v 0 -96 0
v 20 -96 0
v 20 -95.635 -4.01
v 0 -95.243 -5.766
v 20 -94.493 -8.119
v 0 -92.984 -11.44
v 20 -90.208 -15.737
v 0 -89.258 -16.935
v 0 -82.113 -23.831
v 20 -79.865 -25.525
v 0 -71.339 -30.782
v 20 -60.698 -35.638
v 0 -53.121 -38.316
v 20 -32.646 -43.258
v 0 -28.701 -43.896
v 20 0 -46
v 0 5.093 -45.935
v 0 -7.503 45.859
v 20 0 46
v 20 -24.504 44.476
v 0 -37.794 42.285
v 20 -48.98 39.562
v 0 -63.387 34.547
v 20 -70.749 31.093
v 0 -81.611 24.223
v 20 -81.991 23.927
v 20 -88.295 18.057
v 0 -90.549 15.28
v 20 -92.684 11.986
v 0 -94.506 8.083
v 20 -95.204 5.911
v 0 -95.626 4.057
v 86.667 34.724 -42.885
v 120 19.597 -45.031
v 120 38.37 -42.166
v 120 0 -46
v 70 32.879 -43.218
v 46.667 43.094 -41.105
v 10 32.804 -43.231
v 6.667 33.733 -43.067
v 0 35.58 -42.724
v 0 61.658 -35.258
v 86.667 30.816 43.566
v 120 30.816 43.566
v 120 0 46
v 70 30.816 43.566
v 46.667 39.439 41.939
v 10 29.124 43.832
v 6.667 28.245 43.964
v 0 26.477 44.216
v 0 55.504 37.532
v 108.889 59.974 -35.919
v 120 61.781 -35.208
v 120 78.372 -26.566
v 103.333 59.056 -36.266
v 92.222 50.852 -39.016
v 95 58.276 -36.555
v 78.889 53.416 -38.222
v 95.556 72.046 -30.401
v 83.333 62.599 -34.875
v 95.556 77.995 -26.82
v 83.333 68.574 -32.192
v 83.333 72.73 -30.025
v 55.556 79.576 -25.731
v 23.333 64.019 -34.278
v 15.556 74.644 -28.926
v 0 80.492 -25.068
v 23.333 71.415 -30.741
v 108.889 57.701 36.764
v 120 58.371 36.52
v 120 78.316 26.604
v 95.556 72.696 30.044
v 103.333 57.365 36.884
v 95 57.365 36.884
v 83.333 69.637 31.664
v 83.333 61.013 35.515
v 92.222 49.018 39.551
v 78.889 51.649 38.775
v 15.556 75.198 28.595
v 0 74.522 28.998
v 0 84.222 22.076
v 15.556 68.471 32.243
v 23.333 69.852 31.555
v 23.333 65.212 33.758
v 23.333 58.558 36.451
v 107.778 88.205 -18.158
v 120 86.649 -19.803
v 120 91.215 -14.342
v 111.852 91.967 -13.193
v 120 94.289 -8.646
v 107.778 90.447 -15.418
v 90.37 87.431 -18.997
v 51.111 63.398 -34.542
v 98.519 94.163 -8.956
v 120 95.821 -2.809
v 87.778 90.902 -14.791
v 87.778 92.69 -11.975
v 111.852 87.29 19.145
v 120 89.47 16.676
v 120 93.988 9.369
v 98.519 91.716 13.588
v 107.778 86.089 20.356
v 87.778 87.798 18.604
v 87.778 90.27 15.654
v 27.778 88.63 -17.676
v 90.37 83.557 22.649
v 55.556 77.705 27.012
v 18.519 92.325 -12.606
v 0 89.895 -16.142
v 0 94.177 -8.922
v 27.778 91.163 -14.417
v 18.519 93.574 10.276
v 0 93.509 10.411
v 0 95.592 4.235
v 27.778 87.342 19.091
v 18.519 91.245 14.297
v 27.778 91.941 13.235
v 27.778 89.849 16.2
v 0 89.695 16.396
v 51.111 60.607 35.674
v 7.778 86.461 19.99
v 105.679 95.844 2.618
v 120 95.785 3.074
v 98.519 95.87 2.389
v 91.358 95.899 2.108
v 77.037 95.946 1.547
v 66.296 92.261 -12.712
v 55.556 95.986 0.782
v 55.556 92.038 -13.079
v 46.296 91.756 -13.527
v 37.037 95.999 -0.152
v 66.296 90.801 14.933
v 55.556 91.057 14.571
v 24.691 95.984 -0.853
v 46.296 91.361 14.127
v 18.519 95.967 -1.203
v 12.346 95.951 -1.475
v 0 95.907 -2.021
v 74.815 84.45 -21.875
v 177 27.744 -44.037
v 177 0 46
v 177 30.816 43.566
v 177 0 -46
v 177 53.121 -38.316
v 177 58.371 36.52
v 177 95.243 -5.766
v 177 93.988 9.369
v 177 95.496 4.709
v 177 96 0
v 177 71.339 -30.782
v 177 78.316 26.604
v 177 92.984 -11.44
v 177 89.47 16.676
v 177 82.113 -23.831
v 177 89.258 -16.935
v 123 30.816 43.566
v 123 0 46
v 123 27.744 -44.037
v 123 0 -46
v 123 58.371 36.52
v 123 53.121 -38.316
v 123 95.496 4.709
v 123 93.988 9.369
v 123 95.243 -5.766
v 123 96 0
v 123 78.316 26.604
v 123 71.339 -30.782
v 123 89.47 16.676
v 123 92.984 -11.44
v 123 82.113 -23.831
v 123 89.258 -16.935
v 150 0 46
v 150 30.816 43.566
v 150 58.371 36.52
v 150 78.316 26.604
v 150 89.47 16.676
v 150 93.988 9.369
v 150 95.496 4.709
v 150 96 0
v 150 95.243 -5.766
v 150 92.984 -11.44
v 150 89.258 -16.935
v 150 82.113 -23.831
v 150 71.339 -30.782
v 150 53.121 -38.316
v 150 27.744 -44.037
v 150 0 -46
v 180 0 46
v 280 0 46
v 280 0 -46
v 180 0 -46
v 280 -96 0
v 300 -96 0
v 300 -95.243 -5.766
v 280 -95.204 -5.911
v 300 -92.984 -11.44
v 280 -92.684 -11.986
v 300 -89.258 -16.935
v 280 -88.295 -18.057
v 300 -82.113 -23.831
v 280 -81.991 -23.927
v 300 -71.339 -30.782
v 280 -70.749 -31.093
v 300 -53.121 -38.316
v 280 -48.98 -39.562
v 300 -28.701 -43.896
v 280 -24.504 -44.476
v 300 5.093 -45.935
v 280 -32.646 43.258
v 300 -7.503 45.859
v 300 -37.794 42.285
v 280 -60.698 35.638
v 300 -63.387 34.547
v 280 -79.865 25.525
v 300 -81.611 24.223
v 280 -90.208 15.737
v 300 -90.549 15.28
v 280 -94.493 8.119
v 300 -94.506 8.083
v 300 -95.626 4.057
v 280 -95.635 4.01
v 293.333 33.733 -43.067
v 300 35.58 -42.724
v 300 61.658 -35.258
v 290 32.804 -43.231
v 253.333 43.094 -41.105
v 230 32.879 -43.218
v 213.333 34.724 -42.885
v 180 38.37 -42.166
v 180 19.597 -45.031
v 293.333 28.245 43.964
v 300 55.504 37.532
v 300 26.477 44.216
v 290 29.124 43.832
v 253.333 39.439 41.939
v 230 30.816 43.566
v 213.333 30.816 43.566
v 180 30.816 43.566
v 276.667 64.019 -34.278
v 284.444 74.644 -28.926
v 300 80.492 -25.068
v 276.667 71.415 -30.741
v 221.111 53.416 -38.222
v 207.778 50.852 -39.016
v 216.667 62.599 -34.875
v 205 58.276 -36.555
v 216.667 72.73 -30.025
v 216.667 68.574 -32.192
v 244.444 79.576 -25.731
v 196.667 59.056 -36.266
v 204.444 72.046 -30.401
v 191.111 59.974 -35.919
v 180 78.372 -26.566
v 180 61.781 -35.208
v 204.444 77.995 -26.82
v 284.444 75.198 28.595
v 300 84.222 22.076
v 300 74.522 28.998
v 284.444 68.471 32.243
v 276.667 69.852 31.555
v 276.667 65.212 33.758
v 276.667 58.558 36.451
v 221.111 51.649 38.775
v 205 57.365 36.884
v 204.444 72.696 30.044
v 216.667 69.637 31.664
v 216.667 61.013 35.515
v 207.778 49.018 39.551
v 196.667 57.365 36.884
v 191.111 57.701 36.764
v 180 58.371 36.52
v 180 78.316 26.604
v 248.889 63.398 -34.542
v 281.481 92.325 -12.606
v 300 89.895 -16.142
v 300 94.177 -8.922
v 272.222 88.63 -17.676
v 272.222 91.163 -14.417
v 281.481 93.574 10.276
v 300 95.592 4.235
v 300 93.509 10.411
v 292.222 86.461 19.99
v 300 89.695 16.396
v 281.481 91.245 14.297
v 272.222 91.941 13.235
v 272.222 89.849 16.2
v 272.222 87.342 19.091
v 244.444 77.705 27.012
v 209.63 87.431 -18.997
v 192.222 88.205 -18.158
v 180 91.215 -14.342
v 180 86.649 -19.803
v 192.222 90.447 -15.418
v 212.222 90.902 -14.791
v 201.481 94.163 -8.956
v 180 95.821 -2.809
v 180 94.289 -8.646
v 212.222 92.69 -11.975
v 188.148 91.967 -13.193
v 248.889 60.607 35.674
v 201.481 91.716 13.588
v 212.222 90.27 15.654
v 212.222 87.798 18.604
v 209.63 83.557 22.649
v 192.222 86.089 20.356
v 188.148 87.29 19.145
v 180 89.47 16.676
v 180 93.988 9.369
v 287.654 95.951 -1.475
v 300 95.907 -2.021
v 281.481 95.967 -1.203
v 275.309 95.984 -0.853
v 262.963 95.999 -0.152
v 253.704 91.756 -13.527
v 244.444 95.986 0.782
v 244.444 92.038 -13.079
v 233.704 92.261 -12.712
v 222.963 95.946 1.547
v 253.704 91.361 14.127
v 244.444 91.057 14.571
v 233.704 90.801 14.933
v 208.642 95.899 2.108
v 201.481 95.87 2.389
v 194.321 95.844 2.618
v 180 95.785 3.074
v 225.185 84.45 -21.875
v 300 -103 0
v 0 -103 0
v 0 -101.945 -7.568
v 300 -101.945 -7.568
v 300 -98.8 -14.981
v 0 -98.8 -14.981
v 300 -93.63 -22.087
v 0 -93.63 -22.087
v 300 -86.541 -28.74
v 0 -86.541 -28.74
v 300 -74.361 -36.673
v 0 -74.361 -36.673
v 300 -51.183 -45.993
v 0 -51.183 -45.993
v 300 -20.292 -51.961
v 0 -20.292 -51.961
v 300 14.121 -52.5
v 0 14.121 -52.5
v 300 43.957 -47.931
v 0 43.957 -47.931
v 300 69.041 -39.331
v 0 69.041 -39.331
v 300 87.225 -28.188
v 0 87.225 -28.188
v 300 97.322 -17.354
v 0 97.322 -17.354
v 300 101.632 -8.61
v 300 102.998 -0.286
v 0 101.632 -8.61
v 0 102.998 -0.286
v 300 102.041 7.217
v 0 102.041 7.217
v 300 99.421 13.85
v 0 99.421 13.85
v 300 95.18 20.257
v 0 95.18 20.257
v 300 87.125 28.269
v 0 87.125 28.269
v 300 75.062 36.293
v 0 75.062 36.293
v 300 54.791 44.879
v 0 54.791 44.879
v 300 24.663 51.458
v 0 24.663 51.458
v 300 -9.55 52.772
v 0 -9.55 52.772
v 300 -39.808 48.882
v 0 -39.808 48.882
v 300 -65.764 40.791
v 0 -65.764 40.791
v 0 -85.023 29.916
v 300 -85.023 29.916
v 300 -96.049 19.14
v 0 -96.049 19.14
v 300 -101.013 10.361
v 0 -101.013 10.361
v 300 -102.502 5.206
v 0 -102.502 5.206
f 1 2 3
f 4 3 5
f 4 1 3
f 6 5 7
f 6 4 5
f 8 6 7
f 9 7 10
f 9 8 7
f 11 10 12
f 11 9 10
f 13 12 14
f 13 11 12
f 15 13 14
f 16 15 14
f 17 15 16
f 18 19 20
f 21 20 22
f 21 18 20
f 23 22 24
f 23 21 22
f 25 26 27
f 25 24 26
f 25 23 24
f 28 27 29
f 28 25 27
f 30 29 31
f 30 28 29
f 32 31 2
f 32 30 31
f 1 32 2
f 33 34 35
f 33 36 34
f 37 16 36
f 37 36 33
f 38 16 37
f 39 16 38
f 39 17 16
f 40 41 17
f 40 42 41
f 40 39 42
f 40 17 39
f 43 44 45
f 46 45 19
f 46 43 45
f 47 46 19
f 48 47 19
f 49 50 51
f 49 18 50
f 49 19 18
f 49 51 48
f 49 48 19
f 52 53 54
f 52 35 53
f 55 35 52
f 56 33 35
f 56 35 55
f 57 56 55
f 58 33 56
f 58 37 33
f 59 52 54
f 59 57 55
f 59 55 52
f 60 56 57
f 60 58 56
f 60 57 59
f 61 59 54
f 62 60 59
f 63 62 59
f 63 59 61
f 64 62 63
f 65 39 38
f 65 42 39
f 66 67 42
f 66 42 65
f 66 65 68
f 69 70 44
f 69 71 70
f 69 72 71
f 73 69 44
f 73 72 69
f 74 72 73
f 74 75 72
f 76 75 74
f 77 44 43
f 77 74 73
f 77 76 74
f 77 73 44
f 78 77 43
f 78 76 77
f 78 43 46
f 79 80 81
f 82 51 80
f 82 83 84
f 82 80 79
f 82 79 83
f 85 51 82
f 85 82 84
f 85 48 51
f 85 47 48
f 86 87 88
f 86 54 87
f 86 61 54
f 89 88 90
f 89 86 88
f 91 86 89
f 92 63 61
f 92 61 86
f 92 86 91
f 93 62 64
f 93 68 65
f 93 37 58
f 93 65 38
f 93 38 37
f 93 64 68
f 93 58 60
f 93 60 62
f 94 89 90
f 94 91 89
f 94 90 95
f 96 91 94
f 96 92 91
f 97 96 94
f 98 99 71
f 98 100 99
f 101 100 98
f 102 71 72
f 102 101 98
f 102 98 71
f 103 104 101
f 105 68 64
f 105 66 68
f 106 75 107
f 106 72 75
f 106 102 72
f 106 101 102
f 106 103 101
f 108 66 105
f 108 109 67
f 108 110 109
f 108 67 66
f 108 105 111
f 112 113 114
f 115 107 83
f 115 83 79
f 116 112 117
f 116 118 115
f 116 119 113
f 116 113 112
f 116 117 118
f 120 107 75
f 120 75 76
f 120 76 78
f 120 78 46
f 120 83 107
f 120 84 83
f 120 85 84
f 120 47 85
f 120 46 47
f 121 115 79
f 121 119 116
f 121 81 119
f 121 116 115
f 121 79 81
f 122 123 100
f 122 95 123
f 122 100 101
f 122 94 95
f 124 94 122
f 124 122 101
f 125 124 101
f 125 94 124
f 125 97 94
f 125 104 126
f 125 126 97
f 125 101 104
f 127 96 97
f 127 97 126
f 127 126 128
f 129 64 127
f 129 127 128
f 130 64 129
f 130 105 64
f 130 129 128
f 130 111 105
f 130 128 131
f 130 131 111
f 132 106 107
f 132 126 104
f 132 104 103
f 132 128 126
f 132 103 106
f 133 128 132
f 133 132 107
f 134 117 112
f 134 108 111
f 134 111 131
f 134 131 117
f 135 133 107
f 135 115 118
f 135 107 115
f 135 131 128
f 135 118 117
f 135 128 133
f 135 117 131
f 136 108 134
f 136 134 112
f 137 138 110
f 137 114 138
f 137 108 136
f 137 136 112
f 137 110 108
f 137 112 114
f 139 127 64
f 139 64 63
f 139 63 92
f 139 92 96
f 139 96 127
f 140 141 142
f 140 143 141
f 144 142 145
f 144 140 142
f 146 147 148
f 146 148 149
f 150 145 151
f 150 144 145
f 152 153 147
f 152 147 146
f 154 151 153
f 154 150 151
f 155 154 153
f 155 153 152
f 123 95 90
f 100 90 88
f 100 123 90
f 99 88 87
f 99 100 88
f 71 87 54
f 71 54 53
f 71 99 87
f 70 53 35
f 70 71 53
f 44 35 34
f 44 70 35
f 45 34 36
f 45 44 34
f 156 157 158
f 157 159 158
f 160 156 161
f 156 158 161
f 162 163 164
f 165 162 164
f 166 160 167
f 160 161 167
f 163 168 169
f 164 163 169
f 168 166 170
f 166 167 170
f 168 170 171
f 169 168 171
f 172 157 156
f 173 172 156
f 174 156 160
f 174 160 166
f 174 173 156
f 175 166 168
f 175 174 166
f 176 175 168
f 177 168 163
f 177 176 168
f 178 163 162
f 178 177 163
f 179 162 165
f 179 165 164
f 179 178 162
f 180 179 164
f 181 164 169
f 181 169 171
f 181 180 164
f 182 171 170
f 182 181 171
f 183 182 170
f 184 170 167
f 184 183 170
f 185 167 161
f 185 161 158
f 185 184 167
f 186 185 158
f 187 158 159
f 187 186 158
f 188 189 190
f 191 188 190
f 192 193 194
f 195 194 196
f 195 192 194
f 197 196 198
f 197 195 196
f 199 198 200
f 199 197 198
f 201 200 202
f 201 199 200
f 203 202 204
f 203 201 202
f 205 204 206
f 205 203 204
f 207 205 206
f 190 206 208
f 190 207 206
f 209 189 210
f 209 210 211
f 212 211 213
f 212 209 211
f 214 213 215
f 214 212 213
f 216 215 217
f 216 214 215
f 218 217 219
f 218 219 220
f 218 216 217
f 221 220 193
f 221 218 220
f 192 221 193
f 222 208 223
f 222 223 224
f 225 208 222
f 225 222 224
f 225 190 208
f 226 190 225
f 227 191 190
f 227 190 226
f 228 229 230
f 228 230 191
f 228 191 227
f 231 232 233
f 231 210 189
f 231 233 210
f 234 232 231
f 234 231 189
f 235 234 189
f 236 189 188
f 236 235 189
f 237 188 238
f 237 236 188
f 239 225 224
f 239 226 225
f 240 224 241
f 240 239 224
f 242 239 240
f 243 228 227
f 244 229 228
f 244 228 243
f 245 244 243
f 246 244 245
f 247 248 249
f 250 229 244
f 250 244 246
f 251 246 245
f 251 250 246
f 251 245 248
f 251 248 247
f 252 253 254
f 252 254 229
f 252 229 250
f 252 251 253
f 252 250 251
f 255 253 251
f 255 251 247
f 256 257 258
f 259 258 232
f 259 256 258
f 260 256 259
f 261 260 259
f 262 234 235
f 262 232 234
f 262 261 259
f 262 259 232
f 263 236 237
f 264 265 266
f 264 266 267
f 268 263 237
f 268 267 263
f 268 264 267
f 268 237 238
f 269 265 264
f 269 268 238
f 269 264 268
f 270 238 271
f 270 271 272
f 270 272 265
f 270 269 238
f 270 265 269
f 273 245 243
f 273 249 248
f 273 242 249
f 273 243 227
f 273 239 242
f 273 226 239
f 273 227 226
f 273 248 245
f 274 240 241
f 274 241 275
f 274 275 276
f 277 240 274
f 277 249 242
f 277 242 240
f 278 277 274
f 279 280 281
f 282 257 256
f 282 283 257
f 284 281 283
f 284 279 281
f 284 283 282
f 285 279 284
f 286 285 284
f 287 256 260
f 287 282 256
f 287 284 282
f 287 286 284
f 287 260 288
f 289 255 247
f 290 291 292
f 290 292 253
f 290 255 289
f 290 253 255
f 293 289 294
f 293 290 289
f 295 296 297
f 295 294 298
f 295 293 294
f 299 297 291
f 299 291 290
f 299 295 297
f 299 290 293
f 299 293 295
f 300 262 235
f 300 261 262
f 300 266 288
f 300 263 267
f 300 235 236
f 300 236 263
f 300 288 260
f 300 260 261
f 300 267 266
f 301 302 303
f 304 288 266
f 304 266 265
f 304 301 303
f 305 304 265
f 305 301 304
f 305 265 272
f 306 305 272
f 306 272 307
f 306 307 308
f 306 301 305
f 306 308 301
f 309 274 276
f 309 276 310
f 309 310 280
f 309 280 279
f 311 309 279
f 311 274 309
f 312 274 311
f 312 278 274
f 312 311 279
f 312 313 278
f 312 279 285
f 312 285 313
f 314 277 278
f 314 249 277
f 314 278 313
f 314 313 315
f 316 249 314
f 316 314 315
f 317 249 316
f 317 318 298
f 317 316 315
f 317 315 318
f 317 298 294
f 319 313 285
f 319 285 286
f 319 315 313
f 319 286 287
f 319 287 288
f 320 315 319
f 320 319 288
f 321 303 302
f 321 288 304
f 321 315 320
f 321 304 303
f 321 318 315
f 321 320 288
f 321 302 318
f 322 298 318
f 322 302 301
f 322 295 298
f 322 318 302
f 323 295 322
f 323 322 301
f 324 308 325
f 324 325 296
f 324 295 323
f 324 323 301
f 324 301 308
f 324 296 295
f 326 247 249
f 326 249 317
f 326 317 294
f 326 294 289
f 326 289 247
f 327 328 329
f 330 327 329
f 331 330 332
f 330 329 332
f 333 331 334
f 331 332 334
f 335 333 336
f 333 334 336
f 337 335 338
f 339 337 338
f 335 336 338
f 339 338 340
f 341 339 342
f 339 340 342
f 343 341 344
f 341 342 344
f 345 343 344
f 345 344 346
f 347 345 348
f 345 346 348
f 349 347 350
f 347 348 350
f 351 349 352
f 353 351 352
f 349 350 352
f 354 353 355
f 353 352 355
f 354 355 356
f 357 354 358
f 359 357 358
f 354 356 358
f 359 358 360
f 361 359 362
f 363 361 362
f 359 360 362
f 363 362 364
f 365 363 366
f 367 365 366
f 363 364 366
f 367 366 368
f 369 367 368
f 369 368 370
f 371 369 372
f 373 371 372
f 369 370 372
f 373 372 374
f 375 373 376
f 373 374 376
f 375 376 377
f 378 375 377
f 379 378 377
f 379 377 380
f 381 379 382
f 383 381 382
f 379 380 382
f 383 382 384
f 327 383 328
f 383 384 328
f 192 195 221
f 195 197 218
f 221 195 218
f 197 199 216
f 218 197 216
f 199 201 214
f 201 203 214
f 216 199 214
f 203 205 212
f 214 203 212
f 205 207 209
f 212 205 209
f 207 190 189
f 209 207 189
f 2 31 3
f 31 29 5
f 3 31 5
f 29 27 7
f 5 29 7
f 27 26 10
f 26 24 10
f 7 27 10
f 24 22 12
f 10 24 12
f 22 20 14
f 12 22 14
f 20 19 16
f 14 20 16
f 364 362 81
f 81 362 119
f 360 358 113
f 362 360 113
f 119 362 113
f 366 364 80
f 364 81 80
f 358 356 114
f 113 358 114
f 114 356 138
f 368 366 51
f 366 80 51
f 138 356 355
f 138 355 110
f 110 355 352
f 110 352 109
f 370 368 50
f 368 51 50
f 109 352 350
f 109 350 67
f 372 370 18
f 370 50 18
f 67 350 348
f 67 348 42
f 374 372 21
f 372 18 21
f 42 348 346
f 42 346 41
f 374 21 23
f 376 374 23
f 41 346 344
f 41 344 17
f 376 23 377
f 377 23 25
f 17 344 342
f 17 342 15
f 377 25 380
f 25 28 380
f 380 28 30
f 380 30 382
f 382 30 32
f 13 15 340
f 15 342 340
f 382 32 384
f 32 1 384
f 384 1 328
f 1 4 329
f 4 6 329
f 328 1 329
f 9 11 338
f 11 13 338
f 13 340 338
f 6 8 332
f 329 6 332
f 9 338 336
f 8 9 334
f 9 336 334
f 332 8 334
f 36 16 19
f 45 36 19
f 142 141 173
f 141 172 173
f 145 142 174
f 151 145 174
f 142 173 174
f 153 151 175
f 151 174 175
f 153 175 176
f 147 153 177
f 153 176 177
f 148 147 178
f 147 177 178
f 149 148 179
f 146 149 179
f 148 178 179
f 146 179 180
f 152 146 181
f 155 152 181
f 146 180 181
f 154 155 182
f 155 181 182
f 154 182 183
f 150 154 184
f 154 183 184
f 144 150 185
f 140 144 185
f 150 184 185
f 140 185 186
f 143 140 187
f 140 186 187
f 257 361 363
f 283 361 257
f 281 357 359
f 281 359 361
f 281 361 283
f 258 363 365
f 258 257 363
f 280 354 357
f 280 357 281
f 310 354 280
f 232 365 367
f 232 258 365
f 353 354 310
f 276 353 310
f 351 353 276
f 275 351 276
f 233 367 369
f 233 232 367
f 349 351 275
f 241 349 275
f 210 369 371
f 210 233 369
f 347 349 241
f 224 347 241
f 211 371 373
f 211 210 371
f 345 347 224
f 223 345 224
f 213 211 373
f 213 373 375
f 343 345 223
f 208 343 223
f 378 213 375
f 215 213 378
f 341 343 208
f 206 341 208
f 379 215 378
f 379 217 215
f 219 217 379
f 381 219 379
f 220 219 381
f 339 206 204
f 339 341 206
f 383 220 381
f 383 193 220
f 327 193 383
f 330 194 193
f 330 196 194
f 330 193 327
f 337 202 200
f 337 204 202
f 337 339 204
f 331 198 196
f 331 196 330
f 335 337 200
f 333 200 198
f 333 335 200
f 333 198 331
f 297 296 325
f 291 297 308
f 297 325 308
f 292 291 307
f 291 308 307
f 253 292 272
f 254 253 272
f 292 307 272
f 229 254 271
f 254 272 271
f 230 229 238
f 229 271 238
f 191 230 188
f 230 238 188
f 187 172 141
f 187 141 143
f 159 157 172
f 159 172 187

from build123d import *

# Parameters (mm, degrees)
SKETCH_1_RX              = 103
SKETCH_1_RY              = 53
SKETCH_1_RX_2            = 96
SKETCH_1_RY_2            = 46
EXTRUDE_1_DEPTH          = 300
SKETCH_2_RX              = 96
SKETCH_2_RY              = 46
EXTRUDE_2_DEPTH          = 30
EXTRUDE_2_DEPTH_BACK     = 30
SKETCH_3_RX              = 96
SKETCH_3_RY              = 46
CUT_EXTRUDE_1_DEPTH      = 27
CUT_EXTRUDE_1_DEPTH_BACK = 27
EXTRUDE_3_DEPTH          = 100
EXTRUDE_4_DEPTH          = 100
EXTRUDE_5_REACH          = 179


with BuildPart() as part:
    # Эскиз1 → Бобышка-Вытянуть1 (new body)
    with BuildSketch(Plane(origin=(0, 0, 0), x_dir=(0, 0, -1), z_dir=(1, 0, 0))):
        with Locations(Location((0, 0), (0, 0, -90))):
            Ellipse(SKETCH_1_RX, SKETCH_1_RY)
        with Locations(Location((0, 0), (0, 0, -90))):
            Ellipse(SKETCH_1_RX_2, SKETCH_1_RY_2, mode=Mode.SUBTRACT)
    extrude(amount=EXTRUDE_1_DEPTH)

    # Эскиз2 → Бобышка-Вытянуть2 (add, two sides)
    with BuildSketch(Plane.ZY.offset(-150)) as extrude_2_sk:
        with Locations(Location((0, 0), (0, 0, -90))):
            Ellipse(SKETCH_2_RX, SKETCH_2_RY)
    extrude(amount=EXTRUDE_2_DEPTH)
    extrude(extrude_2_sk.sketch, amount=-EXTRUDE_2_DEPTH_BACK)

    # Эскиз3 → Вырез-Вытянуть1 (cut, two sides)
    with BuildSketch(Plane.ZY.offset(-150)) as cut_extrude_1_sk:
        with Locations(Location((0, 0), (0, 0, 90))):
            Ellipse(SKETCH_3_RX, SKETCH_3_RY)
    extrude(amount=CUT_EXTRUDE_1_DEPTH, mode=Mode.SUBTRACT)
    extrude(cut_extrude_1_sk.sketch, amount=-CUT_EXTRUDE_1_DEPTH_BACK, mode=Mode.SUBTRACT)

    # Эскиз4 → Бобышка-Вытянуть3 (add)
    with BuildSketch(Plane.ZY.offset(-120)):
        with BuildLine():
            Line((-46, 0), (46, 0))
            add(Edge.make_bspline(
                [(-46, 0), (-46, -96), (0, -96), (46, -96), (46, 0)],
                knots=[4.71238898, 4.71238898, 4.71238898, 6.283185307, 6.283185307, 7.853981634, 7.853981634, 7.853981634], degree=2, weights=[1, 0.707106781, 1, 0.707106781, 1]))
        make_face()
    extrude(amount=EXTRUDE_3_DEPTH)

    # Эскиз5 → Бобышка-Вытянуть4 (add)
    with BuildSketch(Plane(origin=(180, 0, 0), x_dir=(0, 0, -1), z_dir=(1, 0, 0))):
        with BuildLine():
            Line((-46, 0), (46, 0))
            add(Edge.make_bspline(
                [(-46, 0), (-46, -96), (0, -96), (46, -96), (46, 0)],
                knots=[4.71238898, 4.71238898, 4.71238898, 6.283185307, 6.283185307, 7.853981634, 7.853981634, 7.853981634], degree=2, weights=[1, 0.707106781, 1, 0.707106781, 1]))
        make_face()
    extrude(amount=EXTRUDE_4_DEPTH)

    # Эскиз6 → Бобышка-Вытянуть5 (add, up to next)
    with BuildSketch(Plane(origin=(123, 0, 0), x_dir=(0, 0, -1), z_dir=(1, 0, 0)), mode=Mode.PRIVATE) as extrude_5_sk1:
        with BuildLine():
            Line((-46, 0), (46, 0))
            add(Edge.make_bspline(
                [(-46, 0), (-46, -96), (0, -96), (46, -96), (46, 0)],
                knots=[4.71238898, 4.71238898, 4.71238898, 6.283185307, 6.283185307, 7.853981634, 7.853981634, 7.853981634], degree=2, weights=[1, 0.707106781, 1, 0.707106781, 1]))
        make_face()
    extrude_5_tool1 = extrude(extrude_5_sk1.sketch, amount=EXTRUDE_5_REACH, mode=Mode.PRIVATE) - part.part
    add(extrude_5_tool1.solids().sort_by_distance((123, -40.735468, 0))[0])


solid = part.part
